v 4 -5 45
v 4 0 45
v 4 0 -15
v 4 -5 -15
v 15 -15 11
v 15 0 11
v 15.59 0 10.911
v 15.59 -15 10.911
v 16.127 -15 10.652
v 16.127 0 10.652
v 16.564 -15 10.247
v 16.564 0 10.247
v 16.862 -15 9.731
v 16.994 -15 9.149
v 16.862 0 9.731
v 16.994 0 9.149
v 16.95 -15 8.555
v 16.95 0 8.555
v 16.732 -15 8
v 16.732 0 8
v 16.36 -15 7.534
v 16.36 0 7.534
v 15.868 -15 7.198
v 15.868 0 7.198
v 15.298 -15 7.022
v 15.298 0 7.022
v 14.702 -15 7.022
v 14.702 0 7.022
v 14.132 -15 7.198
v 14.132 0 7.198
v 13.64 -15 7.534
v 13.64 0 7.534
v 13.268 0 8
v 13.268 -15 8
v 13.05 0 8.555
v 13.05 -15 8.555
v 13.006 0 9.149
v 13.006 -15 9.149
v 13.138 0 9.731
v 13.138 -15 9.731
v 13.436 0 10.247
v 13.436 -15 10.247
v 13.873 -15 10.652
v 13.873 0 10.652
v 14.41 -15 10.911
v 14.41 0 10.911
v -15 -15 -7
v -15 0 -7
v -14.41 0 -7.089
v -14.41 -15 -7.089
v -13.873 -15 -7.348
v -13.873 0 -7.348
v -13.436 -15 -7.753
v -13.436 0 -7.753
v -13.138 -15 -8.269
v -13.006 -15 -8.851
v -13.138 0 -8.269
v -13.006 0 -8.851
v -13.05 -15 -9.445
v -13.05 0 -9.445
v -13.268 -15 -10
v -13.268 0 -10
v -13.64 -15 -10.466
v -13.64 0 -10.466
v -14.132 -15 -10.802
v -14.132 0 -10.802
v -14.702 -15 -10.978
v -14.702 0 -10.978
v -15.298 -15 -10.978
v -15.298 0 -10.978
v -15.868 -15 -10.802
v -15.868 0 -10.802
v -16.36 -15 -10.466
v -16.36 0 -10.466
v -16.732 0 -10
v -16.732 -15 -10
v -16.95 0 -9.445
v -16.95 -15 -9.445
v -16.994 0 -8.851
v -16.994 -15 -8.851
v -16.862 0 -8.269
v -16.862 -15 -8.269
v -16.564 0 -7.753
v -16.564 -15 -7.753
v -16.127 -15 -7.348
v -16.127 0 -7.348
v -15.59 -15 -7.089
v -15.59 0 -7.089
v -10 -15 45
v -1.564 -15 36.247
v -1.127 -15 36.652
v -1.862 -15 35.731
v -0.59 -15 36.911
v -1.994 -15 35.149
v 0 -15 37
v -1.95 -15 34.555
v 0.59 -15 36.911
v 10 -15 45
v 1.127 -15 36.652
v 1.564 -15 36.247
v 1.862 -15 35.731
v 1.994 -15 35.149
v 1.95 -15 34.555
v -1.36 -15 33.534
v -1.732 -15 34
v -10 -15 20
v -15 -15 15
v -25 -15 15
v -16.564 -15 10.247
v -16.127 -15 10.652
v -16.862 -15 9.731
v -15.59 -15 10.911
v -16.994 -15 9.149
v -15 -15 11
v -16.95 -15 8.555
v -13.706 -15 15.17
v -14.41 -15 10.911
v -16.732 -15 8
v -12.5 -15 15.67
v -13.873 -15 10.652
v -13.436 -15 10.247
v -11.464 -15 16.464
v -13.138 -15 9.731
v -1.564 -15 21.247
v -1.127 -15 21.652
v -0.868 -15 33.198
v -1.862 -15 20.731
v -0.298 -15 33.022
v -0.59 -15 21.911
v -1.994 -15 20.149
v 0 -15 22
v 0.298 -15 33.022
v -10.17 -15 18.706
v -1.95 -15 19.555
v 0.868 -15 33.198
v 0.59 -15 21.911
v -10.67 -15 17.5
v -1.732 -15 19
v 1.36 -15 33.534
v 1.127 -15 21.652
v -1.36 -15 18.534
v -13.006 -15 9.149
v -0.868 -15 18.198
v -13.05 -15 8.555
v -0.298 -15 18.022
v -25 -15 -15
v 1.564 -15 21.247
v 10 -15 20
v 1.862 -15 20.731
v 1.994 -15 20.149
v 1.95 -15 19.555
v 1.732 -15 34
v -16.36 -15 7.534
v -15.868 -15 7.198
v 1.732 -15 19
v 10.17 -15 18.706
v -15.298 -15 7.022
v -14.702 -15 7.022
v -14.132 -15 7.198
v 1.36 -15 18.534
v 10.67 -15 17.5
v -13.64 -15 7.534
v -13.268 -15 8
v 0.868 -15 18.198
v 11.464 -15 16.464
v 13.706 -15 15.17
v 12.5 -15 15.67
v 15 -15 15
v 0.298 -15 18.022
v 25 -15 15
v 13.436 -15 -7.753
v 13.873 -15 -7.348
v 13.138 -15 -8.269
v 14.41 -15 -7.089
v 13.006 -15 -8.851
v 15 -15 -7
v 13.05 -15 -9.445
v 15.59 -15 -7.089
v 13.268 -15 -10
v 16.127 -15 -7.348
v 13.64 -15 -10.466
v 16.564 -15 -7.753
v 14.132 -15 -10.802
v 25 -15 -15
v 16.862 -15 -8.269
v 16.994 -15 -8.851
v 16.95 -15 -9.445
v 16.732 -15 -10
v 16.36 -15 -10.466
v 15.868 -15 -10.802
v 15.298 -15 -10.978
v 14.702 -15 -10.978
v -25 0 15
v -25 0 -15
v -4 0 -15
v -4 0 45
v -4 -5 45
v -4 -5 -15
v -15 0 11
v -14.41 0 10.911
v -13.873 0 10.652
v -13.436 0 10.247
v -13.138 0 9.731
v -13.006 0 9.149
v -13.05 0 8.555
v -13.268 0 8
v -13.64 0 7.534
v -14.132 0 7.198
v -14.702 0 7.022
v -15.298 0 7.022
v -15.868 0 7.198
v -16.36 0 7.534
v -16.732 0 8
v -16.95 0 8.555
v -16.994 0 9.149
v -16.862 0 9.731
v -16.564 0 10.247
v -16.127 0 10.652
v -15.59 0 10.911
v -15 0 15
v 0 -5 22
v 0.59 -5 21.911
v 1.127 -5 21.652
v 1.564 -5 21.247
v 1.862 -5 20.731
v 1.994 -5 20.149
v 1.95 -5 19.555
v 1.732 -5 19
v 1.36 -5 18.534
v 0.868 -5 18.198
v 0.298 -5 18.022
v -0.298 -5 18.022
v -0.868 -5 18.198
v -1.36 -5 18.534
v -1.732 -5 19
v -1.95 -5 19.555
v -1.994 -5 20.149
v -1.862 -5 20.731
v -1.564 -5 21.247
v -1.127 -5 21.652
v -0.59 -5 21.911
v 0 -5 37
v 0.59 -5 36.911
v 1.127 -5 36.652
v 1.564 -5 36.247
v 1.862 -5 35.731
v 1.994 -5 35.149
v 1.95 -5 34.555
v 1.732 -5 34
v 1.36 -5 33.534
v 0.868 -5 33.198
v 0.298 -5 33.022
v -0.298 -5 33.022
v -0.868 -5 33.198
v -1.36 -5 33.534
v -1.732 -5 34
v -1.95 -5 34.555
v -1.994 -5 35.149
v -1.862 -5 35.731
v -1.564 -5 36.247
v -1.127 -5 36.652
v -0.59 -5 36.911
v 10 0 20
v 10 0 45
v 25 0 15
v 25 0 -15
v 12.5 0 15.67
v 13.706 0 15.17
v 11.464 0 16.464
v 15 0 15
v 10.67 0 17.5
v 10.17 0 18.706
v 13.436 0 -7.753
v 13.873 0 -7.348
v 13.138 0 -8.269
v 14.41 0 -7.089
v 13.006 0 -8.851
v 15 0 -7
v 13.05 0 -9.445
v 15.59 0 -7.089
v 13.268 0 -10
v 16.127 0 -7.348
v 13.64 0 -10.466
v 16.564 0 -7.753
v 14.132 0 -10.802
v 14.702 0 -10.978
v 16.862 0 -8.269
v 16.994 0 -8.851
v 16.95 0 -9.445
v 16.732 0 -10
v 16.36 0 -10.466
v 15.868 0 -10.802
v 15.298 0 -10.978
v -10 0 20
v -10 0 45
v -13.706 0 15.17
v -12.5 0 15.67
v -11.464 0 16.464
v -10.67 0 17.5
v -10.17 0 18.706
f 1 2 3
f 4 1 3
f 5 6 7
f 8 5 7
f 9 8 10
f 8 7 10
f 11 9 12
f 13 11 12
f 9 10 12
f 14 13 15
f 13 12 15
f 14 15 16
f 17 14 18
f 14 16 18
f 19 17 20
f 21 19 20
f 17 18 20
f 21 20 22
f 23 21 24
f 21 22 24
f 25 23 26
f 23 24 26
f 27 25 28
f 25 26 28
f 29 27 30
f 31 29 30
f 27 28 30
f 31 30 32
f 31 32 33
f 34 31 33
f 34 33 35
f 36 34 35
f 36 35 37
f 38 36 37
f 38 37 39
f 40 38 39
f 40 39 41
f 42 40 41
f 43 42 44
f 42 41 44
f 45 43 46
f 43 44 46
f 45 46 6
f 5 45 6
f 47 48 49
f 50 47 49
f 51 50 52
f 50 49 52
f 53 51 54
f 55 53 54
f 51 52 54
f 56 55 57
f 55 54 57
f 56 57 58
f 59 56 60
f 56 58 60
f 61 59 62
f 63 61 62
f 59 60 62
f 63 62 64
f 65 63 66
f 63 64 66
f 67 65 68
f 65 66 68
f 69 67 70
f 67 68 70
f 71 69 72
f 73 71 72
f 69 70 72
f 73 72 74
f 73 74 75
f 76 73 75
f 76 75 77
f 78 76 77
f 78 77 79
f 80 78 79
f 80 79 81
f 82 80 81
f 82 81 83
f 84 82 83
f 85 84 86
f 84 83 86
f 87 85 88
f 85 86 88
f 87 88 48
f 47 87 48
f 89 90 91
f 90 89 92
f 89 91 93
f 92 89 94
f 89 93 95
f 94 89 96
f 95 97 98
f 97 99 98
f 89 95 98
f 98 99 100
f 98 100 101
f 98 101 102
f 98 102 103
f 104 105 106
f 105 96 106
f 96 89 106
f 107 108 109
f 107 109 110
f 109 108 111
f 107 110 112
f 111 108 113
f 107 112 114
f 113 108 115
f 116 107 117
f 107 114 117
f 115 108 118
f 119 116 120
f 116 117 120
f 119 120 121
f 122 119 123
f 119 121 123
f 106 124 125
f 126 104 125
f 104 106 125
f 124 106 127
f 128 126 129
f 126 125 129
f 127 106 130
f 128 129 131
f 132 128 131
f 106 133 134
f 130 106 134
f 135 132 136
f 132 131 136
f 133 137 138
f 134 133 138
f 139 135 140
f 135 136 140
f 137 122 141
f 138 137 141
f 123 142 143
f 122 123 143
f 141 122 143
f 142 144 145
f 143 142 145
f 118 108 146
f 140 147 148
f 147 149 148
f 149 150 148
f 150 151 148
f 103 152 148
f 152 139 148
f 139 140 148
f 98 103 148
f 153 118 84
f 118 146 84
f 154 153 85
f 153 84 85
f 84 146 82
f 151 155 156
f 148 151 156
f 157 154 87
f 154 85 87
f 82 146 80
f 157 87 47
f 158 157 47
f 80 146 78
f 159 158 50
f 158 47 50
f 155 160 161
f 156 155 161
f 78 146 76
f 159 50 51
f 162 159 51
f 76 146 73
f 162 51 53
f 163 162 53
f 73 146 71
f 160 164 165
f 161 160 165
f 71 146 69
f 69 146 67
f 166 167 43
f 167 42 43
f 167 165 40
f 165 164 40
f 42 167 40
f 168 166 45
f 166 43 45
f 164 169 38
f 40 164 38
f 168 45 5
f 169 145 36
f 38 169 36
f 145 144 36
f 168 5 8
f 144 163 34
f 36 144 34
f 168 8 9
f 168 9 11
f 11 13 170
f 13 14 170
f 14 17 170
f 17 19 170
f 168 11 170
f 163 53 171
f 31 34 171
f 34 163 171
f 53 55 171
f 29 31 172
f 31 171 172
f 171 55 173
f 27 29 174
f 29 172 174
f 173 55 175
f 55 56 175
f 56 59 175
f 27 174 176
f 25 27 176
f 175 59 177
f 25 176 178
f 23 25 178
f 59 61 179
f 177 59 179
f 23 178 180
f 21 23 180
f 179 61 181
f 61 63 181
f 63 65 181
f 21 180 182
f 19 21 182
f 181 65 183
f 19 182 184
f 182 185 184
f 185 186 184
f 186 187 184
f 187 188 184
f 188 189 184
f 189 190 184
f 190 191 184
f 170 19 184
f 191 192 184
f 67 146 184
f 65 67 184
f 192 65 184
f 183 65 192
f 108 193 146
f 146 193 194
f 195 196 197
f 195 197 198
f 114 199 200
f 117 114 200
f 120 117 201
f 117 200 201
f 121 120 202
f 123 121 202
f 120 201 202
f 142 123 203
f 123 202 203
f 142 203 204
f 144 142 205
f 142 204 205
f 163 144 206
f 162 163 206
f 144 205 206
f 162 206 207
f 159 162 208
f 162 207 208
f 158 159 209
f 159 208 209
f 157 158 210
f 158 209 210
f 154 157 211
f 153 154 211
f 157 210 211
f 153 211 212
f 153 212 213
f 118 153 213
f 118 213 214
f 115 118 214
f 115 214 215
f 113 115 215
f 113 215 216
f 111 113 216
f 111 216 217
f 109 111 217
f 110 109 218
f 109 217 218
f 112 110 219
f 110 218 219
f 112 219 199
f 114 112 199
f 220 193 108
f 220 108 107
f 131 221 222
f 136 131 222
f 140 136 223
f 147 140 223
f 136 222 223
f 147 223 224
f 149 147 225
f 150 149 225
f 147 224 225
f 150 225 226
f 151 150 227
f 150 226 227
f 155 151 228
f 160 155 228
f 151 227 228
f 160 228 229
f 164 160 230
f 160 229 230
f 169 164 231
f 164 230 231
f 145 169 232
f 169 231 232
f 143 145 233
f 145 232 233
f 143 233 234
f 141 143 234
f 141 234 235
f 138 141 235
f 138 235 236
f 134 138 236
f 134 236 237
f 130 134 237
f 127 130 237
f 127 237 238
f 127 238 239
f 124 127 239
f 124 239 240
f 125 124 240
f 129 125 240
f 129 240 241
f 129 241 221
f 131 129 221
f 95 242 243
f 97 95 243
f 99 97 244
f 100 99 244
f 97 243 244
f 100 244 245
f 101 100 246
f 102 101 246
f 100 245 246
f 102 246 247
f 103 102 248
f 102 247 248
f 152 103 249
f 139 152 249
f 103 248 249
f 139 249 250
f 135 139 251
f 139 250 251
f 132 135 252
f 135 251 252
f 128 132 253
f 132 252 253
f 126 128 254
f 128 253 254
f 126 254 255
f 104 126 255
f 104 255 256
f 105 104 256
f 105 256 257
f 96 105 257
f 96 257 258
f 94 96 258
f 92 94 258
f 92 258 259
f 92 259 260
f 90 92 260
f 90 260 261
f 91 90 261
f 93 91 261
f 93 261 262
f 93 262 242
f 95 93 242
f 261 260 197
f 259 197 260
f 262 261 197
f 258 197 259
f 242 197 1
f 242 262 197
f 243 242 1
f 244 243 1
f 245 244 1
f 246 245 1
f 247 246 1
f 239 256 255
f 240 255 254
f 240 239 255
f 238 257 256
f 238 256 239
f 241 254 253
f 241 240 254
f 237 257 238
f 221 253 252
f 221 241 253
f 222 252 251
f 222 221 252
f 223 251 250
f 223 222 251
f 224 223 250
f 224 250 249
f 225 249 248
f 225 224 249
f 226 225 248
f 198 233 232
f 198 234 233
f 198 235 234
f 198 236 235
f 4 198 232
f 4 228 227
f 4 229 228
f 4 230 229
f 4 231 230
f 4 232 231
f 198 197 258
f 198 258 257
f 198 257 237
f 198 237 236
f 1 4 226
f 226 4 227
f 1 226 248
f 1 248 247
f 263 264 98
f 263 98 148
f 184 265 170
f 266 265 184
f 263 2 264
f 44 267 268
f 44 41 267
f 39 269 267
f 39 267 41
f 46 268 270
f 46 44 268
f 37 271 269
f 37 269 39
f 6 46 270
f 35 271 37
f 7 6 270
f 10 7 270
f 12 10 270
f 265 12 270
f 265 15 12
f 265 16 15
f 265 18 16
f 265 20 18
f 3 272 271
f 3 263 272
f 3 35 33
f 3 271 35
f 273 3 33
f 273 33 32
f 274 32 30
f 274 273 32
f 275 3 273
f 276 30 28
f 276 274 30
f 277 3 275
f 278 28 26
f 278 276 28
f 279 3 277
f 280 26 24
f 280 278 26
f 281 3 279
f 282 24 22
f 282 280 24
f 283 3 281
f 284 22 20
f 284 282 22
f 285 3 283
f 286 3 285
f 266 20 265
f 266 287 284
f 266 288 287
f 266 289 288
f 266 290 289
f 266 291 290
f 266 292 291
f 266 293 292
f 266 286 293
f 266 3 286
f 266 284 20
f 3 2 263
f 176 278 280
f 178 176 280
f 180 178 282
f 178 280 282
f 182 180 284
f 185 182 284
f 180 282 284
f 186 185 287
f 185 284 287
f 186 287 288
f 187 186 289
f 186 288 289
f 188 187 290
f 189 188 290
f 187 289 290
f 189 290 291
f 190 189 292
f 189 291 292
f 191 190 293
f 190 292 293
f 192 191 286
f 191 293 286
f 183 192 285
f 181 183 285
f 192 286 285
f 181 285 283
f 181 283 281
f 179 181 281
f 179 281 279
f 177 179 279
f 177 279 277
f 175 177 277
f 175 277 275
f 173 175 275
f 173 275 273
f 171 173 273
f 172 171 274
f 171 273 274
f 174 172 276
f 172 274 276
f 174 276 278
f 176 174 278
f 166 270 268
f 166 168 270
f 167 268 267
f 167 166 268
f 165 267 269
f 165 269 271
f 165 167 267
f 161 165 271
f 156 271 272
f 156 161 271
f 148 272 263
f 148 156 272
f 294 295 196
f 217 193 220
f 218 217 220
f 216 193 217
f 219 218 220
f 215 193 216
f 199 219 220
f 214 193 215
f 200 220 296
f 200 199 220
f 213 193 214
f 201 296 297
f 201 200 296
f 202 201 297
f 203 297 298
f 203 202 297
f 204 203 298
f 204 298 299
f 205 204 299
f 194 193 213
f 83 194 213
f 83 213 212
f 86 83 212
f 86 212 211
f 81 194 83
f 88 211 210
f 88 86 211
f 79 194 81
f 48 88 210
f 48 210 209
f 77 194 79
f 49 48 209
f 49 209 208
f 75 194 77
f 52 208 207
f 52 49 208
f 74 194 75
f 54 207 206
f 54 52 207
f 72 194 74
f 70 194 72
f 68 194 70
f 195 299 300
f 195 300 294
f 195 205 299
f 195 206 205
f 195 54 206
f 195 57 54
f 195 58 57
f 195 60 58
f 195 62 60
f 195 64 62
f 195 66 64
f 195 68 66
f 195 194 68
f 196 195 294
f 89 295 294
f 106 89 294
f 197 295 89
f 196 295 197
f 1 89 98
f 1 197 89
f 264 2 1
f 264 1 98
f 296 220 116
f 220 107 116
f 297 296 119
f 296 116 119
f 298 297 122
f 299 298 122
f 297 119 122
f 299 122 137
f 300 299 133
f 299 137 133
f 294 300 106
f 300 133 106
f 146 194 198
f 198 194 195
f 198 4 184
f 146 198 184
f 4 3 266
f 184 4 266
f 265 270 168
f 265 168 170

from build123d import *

# Parameters (mm, degrees)
SKETCH1_W           = 50
SKETCH1_H           = 30
SKETCH1_R           = 2
BOSS_EXTRUDE2_DEPTH = 15
SKETCH1_3_W         = 20
SKETCH1_3_H         = 30
SKETCH1_3_R         = 2
BOSS_EXTRUDE3_DEPTH = 15
FILLET1_R           = 5
SKETCH5_W           = 8
SKETCH5_H           = 70
CUT_EXTRUDE1_DEPTH  = 5


with BuildPart() as part:
    # Sketch1 → Boss-Extrude2 (new body)
    with BuildSketch(Plane(origin=(0, 0, 0), x_dir=(1, 0, 0), z_dir=(0, 1, 0))):
        Rectangle(SKETCH1_W, SKETCH1_H)
        with Locations(Location((-15, 9, 0), (0, 0, 270))):
            Circle(SKETCH1_R, mode=Mode.SUBTRACT)
        with Locations(Location((15, 9, 0), (0, 0, 270))):
            Circle(SKETCH1_R, mode=Mode.SUBTRACT)
        with Locations(Location((15, -9, 0), (0, 0, 270))):
            Circle(SKETCH1_R, mode=Mode.SUBTRACT)
        with Locations(Location((-15, -9, 0), (0, 0, 270))):
            Circle(SKETCH1_R, mode=Mode.SUBTRACT)
    extrude(amount=-BOSS_EXTRUDE2_DEPTH)

    # Sketch1<3> → Boss-Extrude3 (add)
    with BuildSketch(Plane(origin=(0, 0, 0), x_dir=(1, 0, 0), z_dir=(0, 1, 0))):
        with Locations((0, -30)):
            Rectangle(SKETCH1_3_W, SKETCH1_3_H)
        with Locations(Location((0, -35, 0), (0, 0, 270))):
            Circle(SKETCH1_3_R, mode=Mode.SUBTRACT)
        with Locations(Location((0, -20, 0), (0, 0, 270))):
            Circle(SKETCH1_3_R, mode=Mode.SUBTRACT)
    extrude(amount=-BOSS_EXTRUDE3_DEPTH)

    # Fillet1
    fillet1_edges = [part.edges().sort_by_distance(p)[0] for p in [
        (-10, -7.5, 15),
        (10, -7.5, 15),
    ]]
    fillet(fillet1_edges, radius=FILLET1_R)

    # Sketch5 → Cut-Extrude1 (cut)
    with BuildSketch(Plane(origin=(0, 0, 0), x_dir=(1, 0, 0), z_dir=(0, 1, 0))):
        with Locations((0, -13.137566138)):
            Rectangle(SKETCH5_W, SKETCH5_H)
    extrude(amount=-CUT_EXTRUDE1_DEPTH, mode=Mode.SUBTRACT)


solid = part.part
